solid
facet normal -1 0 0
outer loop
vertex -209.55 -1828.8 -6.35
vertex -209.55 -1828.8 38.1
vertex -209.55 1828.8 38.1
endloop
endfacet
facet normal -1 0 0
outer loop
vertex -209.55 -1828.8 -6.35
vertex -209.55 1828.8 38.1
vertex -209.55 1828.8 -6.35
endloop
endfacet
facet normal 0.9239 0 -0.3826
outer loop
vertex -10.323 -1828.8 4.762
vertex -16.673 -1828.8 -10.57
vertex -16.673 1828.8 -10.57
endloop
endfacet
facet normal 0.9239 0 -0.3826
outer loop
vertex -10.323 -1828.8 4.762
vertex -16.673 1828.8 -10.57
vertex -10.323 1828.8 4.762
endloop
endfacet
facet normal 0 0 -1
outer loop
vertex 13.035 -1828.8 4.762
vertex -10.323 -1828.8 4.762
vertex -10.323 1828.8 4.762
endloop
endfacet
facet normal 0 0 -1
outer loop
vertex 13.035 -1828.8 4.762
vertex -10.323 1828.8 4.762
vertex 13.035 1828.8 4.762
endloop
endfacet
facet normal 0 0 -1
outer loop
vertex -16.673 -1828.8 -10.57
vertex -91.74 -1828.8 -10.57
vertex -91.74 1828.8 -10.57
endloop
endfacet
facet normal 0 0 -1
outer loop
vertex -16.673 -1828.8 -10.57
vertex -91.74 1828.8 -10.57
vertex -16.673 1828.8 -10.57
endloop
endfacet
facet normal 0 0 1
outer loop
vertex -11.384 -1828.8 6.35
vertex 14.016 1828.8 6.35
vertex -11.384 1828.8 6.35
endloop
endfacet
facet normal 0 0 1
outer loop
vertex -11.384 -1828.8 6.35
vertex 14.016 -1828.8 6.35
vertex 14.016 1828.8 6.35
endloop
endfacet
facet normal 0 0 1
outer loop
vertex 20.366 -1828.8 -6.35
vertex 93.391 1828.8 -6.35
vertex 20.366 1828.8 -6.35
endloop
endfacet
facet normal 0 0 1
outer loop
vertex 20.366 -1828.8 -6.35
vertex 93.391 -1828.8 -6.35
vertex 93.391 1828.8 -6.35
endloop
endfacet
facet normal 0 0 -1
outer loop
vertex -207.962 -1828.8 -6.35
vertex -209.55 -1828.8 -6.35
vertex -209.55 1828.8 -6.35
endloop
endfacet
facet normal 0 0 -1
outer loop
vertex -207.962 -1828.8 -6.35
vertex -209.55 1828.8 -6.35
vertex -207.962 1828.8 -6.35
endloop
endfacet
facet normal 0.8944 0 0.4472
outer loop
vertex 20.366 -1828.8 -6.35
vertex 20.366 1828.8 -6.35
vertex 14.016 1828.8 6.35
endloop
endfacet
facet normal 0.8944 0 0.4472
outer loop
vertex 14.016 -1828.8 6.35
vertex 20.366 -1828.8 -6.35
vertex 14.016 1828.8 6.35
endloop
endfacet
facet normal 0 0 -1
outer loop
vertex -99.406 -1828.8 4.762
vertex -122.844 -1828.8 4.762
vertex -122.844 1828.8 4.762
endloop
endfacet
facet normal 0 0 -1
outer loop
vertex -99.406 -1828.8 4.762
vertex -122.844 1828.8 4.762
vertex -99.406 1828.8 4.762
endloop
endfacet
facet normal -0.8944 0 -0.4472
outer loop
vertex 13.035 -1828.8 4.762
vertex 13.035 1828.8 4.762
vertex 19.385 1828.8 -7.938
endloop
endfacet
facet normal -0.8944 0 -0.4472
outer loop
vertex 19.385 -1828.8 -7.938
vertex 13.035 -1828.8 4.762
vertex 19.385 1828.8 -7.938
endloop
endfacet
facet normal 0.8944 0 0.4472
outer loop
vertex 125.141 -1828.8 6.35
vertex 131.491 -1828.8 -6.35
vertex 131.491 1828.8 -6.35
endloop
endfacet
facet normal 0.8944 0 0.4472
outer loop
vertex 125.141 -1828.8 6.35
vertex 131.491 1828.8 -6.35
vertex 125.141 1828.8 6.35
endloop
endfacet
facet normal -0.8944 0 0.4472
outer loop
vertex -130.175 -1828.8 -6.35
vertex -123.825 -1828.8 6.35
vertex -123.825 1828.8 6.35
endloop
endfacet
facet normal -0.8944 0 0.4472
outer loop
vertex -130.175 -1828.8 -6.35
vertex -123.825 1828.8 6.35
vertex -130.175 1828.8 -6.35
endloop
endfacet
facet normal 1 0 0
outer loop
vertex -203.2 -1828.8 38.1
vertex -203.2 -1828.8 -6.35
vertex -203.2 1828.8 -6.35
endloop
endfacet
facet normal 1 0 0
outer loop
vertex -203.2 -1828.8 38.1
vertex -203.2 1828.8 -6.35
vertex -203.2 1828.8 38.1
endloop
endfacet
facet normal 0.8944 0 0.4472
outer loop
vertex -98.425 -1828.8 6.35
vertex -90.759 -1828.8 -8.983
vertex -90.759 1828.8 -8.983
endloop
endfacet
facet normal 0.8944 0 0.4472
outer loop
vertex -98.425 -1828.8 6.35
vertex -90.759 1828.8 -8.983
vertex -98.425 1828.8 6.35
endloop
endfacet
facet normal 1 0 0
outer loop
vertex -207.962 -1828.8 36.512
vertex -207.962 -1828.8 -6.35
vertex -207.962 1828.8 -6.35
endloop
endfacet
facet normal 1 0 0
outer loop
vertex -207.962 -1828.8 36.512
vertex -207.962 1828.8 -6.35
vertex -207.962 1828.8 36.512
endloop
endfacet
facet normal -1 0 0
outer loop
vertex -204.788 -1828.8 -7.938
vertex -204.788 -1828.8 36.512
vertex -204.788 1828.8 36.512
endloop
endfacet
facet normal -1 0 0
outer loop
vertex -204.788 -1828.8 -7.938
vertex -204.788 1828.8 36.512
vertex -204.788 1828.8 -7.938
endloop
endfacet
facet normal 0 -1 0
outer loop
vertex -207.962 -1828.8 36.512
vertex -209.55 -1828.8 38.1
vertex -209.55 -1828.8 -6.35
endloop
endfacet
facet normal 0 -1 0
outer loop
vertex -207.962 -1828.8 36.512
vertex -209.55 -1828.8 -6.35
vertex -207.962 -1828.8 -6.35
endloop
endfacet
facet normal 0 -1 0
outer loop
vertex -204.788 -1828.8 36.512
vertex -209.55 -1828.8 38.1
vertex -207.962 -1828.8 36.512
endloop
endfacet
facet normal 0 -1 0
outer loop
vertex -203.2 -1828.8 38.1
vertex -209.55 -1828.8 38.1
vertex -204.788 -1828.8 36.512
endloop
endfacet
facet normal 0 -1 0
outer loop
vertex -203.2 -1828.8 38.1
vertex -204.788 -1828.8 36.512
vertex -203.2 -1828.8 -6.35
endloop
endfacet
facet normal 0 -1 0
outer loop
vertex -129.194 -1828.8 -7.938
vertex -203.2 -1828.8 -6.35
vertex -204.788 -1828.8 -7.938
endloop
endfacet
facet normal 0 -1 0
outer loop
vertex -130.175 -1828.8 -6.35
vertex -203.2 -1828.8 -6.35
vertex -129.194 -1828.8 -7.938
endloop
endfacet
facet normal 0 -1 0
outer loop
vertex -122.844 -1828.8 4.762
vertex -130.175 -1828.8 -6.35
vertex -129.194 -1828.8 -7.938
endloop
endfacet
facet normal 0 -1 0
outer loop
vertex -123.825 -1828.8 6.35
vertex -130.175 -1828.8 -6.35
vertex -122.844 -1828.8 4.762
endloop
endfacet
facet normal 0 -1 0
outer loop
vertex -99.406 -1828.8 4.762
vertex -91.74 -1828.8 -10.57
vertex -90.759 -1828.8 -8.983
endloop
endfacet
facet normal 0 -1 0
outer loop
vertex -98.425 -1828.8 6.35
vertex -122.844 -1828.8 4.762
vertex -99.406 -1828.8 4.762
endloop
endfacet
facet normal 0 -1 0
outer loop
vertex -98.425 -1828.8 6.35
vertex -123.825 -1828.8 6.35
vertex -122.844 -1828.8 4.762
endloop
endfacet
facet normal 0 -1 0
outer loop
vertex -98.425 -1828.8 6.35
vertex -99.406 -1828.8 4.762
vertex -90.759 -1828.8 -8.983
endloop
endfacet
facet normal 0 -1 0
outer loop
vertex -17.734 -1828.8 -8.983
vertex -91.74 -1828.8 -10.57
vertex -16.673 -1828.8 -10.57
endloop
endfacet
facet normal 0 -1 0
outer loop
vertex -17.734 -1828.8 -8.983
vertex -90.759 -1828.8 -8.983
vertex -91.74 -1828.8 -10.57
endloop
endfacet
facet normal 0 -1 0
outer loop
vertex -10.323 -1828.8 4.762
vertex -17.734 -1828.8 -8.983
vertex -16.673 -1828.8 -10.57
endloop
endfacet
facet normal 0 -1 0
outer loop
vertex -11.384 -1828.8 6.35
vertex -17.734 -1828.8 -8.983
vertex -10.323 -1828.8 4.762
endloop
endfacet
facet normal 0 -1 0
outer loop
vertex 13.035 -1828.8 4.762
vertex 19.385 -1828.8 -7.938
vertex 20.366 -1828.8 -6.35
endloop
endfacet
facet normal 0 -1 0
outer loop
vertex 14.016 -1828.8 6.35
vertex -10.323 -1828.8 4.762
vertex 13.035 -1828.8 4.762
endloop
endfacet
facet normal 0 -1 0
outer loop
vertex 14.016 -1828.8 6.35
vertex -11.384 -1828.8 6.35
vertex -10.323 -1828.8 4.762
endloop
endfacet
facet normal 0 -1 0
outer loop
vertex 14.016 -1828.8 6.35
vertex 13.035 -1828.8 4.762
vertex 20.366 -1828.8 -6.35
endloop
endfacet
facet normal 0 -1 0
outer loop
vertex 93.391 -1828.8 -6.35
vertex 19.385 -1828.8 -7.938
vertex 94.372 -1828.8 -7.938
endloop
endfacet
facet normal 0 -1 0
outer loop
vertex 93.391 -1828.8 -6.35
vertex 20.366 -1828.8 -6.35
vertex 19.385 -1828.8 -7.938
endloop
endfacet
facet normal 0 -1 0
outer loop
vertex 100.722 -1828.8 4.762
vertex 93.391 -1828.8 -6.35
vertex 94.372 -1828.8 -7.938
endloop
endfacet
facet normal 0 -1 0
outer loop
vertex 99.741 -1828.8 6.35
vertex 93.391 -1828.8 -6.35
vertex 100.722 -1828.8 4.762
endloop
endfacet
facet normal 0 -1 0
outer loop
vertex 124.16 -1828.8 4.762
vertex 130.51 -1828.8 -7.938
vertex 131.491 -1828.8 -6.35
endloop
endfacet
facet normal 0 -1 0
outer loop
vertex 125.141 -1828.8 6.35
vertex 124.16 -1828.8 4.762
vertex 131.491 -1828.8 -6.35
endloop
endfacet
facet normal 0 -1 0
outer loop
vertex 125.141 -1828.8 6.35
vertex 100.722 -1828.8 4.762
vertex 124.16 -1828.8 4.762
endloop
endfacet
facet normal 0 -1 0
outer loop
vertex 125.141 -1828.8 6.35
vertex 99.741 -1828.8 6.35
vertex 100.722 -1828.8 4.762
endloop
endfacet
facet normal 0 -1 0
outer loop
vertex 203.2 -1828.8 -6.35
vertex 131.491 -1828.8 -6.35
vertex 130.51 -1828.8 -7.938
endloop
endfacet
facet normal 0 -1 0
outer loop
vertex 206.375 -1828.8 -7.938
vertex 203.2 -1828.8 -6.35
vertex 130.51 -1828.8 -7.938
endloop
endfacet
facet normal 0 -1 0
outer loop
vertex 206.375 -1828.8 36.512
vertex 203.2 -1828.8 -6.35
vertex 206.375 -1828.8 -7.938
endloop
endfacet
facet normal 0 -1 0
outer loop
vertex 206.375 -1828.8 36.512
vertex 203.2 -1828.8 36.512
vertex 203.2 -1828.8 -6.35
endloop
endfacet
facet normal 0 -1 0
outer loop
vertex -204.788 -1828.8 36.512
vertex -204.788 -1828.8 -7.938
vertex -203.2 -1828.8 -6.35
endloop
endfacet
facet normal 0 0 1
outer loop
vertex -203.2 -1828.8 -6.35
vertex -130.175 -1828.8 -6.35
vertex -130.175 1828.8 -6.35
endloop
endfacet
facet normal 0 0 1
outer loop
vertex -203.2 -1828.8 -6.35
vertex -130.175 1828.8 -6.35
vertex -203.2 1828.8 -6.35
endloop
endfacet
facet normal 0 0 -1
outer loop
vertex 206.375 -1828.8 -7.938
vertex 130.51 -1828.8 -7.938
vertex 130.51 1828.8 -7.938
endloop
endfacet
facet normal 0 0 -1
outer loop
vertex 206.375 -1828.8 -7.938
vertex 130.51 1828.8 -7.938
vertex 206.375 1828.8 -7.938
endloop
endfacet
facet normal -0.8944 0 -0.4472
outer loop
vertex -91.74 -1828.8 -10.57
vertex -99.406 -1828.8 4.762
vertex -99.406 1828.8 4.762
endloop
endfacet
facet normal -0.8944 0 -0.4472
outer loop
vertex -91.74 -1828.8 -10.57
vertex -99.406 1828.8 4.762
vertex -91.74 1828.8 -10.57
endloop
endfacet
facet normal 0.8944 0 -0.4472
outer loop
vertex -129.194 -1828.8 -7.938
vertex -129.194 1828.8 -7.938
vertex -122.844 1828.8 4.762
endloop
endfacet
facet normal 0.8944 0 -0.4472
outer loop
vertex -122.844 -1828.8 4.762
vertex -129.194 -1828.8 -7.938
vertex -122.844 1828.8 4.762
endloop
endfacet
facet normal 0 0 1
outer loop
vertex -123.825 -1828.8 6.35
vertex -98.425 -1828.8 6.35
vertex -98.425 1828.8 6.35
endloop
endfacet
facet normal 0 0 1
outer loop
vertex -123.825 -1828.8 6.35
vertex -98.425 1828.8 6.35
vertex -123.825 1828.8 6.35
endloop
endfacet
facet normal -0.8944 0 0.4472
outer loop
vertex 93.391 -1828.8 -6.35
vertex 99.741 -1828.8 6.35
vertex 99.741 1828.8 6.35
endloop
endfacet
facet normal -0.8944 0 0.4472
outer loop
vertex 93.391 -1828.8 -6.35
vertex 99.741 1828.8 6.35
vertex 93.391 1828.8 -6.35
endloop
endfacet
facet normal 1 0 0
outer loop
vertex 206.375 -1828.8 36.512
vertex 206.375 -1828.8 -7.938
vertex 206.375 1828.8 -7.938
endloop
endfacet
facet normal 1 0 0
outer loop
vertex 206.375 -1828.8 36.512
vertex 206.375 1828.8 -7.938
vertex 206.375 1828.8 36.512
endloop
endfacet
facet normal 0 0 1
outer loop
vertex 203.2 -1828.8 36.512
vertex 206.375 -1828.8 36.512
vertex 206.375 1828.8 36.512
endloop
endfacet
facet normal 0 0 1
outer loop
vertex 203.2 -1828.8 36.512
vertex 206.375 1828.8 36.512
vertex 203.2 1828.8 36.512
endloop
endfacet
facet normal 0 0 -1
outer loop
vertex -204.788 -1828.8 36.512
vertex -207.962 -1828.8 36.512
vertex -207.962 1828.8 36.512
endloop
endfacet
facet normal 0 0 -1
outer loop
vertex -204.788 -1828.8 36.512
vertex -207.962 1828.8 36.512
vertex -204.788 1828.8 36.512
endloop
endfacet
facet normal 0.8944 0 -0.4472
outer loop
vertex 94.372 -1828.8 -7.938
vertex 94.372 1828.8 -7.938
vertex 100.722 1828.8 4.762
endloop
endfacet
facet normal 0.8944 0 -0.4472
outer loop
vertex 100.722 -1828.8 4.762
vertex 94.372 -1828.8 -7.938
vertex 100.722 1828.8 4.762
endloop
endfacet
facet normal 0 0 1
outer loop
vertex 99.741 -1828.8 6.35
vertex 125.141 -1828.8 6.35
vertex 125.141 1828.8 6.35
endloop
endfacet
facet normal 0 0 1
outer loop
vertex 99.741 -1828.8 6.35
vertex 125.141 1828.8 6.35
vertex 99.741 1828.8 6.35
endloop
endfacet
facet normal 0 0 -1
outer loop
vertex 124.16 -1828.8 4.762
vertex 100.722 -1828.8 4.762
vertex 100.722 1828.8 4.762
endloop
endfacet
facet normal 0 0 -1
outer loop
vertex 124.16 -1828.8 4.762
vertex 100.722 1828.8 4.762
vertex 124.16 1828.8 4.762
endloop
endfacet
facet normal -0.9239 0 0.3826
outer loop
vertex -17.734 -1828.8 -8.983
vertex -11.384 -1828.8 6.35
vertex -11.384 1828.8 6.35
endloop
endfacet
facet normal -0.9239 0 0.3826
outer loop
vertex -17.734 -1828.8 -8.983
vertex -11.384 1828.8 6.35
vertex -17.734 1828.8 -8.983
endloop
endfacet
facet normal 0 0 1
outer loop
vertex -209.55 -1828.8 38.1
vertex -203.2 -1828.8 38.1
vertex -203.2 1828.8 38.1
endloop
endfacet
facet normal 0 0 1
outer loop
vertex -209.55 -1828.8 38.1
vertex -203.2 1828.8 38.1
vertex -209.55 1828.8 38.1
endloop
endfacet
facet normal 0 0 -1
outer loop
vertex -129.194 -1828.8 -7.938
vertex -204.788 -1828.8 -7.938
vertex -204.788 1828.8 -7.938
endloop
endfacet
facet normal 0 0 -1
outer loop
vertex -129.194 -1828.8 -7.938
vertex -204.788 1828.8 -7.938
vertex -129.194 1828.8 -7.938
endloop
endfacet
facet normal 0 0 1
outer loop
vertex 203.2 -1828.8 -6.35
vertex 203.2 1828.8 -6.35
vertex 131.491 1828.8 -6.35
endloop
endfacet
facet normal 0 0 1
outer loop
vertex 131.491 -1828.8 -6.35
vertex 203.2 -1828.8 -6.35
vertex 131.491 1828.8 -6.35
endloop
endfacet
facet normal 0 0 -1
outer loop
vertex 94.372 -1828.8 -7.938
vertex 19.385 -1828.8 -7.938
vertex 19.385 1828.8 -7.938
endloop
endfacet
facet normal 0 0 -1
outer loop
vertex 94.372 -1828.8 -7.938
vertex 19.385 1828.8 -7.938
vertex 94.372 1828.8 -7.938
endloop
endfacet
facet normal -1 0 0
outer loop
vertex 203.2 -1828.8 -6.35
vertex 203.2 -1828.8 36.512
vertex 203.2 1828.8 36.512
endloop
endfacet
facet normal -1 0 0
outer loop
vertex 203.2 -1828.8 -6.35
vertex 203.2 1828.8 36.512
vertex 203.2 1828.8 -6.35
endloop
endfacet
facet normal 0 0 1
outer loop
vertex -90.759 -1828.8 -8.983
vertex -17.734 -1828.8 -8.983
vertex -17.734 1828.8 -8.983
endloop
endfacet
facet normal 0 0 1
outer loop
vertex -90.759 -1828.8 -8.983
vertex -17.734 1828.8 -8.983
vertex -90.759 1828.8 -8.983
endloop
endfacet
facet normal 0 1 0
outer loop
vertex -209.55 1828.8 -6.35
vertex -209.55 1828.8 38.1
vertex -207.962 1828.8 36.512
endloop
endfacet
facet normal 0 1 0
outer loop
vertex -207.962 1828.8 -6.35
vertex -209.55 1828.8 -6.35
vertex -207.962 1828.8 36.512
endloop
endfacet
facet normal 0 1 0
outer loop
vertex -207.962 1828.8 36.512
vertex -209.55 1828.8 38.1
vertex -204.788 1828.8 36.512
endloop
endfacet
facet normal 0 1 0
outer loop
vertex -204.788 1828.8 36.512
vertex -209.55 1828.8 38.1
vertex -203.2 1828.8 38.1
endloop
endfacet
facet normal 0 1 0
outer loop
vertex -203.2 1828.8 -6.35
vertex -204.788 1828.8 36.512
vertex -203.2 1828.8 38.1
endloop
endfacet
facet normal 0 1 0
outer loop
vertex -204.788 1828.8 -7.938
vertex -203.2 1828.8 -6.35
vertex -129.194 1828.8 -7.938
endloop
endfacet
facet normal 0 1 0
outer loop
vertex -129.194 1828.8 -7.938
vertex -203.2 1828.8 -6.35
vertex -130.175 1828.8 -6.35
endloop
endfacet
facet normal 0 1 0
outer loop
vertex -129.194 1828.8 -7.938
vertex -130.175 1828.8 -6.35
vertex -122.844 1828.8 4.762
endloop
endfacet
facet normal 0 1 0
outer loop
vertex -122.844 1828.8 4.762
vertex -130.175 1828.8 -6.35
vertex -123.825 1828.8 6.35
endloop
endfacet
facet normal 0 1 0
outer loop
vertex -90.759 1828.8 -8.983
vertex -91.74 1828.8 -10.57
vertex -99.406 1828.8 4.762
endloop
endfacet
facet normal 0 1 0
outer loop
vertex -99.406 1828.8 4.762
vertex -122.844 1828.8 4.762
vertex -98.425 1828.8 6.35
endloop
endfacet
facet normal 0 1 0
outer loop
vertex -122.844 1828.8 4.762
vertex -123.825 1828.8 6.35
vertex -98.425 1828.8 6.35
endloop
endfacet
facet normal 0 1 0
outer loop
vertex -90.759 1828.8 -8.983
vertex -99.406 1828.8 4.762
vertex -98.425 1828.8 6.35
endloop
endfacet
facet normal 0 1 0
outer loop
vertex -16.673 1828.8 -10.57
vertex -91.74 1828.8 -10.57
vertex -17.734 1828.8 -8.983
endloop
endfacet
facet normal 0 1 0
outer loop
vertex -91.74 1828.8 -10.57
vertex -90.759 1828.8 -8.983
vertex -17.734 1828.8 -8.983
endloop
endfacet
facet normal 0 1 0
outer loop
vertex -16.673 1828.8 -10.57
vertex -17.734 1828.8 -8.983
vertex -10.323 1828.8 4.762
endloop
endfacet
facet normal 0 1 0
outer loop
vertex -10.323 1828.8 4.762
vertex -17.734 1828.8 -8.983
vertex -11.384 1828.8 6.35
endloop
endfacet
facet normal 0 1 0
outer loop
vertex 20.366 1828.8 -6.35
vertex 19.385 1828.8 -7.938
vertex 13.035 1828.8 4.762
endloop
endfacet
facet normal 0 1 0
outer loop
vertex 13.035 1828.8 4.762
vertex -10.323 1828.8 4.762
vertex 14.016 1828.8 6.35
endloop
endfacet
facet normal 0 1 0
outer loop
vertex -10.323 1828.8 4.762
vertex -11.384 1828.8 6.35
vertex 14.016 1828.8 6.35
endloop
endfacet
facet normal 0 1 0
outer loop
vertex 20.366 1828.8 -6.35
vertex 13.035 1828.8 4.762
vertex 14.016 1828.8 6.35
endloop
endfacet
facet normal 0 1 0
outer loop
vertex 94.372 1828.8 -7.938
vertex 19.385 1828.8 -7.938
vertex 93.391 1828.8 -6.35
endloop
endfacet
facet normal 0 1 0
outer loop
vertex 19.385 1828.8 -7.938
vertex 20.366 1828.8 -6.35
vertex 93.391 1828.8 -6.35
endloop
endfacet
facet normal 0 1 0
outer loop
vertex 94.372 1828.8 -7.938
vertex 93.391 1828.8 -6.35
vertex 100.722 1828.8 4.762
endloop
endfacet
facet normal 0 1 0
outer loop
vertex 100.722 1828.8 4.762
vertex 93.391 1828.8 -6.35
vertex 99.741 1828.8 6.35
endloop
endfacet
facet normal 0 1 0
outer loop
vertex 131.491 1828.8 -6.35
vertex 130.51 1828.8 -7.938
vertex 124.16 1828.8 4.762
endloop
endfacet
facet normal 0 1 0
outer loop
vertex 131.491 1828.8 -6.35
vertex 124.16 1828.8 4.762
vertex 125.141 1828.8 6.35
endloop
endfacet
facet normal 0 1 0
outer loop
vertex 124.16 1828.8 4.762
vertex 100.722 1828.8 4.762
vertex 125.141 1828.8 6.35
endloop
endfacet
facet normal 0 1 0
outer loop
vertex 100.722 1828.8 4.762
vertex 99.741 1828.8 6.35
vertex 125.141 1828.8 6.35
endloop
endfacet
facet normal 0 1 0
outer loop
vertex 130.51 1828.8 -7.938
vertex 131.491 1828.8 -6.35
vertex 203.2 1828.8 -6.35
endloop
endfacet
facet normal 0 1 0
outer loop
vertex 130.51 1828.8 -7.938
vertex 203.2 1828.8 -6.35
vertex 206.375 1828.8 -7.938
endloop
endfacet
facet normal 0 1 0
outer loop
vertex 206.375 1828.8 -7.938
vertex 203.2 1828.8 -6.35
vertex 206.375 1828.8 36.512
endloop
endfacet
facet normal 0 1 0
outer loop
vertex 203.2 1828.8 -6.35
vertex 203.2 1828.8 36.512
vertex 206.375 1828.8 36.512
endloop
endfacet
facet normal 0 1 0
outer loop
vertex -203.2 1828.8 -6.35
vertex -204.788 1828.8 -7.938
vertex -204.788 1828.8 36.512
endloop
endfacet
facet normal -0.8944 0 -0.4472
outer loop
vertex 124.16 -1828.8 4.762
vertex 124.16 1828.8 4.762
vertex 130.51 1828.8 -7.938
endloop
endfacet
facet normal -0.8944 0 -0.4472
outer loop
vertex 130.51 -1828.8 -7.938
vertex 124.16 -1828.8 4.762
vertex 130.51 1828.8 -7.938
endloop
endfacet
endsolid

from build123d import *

# Parameters (mm, degrees)
F1_DEPTH = 1828.8


with BuildPart() as f1:
    # F0 (on Front) → F1 (new body, symmetric)
    with BuildSketch(Plane.XZ):
        Polygon((14.016321, 6.35), (-11.383679, 6.35), (-17.733679, -8.982642), (-90.758679, -8.982642), (-98.425, 6.35), (-123.825, 6.35), (-130.175, -6.35), (-203.2, -6.35), (-203.2, 38.1), (-209.55, 38.1), (-209.55, -6.35), (-207.9625, -6.35), (-207.9625, 36.5125), (-204.7875, 36.5125), (-204.7875, -7.9375), (-129.193871, -7.9375), (-122.843871, 4.7625), (-99.406129, 4.7625), (-91.739808, -10.570142), (-16.672882, -10.570142), (-10.322882, 4.7625), (13.035192, 4.7625), (19.385192, -7.9375), (94.37245, -7.9375), (100.72245, 4.7625), (124.160192, 4.7625), (130.510192, -7.9375), (204.516321, -7.9375), (206.375, -7.9375), (206.375, 36.5125), (203.2, 36.5125), (203.2, -6.35), (131.491321, -6.35), (125.141321, 6.35), (99.741321, 6.35), (93.391321, -6.35), (20.366321, -6.35), align=None)
    extrude(amount=F1_DEPTH, both=True)


solid = f1.part
